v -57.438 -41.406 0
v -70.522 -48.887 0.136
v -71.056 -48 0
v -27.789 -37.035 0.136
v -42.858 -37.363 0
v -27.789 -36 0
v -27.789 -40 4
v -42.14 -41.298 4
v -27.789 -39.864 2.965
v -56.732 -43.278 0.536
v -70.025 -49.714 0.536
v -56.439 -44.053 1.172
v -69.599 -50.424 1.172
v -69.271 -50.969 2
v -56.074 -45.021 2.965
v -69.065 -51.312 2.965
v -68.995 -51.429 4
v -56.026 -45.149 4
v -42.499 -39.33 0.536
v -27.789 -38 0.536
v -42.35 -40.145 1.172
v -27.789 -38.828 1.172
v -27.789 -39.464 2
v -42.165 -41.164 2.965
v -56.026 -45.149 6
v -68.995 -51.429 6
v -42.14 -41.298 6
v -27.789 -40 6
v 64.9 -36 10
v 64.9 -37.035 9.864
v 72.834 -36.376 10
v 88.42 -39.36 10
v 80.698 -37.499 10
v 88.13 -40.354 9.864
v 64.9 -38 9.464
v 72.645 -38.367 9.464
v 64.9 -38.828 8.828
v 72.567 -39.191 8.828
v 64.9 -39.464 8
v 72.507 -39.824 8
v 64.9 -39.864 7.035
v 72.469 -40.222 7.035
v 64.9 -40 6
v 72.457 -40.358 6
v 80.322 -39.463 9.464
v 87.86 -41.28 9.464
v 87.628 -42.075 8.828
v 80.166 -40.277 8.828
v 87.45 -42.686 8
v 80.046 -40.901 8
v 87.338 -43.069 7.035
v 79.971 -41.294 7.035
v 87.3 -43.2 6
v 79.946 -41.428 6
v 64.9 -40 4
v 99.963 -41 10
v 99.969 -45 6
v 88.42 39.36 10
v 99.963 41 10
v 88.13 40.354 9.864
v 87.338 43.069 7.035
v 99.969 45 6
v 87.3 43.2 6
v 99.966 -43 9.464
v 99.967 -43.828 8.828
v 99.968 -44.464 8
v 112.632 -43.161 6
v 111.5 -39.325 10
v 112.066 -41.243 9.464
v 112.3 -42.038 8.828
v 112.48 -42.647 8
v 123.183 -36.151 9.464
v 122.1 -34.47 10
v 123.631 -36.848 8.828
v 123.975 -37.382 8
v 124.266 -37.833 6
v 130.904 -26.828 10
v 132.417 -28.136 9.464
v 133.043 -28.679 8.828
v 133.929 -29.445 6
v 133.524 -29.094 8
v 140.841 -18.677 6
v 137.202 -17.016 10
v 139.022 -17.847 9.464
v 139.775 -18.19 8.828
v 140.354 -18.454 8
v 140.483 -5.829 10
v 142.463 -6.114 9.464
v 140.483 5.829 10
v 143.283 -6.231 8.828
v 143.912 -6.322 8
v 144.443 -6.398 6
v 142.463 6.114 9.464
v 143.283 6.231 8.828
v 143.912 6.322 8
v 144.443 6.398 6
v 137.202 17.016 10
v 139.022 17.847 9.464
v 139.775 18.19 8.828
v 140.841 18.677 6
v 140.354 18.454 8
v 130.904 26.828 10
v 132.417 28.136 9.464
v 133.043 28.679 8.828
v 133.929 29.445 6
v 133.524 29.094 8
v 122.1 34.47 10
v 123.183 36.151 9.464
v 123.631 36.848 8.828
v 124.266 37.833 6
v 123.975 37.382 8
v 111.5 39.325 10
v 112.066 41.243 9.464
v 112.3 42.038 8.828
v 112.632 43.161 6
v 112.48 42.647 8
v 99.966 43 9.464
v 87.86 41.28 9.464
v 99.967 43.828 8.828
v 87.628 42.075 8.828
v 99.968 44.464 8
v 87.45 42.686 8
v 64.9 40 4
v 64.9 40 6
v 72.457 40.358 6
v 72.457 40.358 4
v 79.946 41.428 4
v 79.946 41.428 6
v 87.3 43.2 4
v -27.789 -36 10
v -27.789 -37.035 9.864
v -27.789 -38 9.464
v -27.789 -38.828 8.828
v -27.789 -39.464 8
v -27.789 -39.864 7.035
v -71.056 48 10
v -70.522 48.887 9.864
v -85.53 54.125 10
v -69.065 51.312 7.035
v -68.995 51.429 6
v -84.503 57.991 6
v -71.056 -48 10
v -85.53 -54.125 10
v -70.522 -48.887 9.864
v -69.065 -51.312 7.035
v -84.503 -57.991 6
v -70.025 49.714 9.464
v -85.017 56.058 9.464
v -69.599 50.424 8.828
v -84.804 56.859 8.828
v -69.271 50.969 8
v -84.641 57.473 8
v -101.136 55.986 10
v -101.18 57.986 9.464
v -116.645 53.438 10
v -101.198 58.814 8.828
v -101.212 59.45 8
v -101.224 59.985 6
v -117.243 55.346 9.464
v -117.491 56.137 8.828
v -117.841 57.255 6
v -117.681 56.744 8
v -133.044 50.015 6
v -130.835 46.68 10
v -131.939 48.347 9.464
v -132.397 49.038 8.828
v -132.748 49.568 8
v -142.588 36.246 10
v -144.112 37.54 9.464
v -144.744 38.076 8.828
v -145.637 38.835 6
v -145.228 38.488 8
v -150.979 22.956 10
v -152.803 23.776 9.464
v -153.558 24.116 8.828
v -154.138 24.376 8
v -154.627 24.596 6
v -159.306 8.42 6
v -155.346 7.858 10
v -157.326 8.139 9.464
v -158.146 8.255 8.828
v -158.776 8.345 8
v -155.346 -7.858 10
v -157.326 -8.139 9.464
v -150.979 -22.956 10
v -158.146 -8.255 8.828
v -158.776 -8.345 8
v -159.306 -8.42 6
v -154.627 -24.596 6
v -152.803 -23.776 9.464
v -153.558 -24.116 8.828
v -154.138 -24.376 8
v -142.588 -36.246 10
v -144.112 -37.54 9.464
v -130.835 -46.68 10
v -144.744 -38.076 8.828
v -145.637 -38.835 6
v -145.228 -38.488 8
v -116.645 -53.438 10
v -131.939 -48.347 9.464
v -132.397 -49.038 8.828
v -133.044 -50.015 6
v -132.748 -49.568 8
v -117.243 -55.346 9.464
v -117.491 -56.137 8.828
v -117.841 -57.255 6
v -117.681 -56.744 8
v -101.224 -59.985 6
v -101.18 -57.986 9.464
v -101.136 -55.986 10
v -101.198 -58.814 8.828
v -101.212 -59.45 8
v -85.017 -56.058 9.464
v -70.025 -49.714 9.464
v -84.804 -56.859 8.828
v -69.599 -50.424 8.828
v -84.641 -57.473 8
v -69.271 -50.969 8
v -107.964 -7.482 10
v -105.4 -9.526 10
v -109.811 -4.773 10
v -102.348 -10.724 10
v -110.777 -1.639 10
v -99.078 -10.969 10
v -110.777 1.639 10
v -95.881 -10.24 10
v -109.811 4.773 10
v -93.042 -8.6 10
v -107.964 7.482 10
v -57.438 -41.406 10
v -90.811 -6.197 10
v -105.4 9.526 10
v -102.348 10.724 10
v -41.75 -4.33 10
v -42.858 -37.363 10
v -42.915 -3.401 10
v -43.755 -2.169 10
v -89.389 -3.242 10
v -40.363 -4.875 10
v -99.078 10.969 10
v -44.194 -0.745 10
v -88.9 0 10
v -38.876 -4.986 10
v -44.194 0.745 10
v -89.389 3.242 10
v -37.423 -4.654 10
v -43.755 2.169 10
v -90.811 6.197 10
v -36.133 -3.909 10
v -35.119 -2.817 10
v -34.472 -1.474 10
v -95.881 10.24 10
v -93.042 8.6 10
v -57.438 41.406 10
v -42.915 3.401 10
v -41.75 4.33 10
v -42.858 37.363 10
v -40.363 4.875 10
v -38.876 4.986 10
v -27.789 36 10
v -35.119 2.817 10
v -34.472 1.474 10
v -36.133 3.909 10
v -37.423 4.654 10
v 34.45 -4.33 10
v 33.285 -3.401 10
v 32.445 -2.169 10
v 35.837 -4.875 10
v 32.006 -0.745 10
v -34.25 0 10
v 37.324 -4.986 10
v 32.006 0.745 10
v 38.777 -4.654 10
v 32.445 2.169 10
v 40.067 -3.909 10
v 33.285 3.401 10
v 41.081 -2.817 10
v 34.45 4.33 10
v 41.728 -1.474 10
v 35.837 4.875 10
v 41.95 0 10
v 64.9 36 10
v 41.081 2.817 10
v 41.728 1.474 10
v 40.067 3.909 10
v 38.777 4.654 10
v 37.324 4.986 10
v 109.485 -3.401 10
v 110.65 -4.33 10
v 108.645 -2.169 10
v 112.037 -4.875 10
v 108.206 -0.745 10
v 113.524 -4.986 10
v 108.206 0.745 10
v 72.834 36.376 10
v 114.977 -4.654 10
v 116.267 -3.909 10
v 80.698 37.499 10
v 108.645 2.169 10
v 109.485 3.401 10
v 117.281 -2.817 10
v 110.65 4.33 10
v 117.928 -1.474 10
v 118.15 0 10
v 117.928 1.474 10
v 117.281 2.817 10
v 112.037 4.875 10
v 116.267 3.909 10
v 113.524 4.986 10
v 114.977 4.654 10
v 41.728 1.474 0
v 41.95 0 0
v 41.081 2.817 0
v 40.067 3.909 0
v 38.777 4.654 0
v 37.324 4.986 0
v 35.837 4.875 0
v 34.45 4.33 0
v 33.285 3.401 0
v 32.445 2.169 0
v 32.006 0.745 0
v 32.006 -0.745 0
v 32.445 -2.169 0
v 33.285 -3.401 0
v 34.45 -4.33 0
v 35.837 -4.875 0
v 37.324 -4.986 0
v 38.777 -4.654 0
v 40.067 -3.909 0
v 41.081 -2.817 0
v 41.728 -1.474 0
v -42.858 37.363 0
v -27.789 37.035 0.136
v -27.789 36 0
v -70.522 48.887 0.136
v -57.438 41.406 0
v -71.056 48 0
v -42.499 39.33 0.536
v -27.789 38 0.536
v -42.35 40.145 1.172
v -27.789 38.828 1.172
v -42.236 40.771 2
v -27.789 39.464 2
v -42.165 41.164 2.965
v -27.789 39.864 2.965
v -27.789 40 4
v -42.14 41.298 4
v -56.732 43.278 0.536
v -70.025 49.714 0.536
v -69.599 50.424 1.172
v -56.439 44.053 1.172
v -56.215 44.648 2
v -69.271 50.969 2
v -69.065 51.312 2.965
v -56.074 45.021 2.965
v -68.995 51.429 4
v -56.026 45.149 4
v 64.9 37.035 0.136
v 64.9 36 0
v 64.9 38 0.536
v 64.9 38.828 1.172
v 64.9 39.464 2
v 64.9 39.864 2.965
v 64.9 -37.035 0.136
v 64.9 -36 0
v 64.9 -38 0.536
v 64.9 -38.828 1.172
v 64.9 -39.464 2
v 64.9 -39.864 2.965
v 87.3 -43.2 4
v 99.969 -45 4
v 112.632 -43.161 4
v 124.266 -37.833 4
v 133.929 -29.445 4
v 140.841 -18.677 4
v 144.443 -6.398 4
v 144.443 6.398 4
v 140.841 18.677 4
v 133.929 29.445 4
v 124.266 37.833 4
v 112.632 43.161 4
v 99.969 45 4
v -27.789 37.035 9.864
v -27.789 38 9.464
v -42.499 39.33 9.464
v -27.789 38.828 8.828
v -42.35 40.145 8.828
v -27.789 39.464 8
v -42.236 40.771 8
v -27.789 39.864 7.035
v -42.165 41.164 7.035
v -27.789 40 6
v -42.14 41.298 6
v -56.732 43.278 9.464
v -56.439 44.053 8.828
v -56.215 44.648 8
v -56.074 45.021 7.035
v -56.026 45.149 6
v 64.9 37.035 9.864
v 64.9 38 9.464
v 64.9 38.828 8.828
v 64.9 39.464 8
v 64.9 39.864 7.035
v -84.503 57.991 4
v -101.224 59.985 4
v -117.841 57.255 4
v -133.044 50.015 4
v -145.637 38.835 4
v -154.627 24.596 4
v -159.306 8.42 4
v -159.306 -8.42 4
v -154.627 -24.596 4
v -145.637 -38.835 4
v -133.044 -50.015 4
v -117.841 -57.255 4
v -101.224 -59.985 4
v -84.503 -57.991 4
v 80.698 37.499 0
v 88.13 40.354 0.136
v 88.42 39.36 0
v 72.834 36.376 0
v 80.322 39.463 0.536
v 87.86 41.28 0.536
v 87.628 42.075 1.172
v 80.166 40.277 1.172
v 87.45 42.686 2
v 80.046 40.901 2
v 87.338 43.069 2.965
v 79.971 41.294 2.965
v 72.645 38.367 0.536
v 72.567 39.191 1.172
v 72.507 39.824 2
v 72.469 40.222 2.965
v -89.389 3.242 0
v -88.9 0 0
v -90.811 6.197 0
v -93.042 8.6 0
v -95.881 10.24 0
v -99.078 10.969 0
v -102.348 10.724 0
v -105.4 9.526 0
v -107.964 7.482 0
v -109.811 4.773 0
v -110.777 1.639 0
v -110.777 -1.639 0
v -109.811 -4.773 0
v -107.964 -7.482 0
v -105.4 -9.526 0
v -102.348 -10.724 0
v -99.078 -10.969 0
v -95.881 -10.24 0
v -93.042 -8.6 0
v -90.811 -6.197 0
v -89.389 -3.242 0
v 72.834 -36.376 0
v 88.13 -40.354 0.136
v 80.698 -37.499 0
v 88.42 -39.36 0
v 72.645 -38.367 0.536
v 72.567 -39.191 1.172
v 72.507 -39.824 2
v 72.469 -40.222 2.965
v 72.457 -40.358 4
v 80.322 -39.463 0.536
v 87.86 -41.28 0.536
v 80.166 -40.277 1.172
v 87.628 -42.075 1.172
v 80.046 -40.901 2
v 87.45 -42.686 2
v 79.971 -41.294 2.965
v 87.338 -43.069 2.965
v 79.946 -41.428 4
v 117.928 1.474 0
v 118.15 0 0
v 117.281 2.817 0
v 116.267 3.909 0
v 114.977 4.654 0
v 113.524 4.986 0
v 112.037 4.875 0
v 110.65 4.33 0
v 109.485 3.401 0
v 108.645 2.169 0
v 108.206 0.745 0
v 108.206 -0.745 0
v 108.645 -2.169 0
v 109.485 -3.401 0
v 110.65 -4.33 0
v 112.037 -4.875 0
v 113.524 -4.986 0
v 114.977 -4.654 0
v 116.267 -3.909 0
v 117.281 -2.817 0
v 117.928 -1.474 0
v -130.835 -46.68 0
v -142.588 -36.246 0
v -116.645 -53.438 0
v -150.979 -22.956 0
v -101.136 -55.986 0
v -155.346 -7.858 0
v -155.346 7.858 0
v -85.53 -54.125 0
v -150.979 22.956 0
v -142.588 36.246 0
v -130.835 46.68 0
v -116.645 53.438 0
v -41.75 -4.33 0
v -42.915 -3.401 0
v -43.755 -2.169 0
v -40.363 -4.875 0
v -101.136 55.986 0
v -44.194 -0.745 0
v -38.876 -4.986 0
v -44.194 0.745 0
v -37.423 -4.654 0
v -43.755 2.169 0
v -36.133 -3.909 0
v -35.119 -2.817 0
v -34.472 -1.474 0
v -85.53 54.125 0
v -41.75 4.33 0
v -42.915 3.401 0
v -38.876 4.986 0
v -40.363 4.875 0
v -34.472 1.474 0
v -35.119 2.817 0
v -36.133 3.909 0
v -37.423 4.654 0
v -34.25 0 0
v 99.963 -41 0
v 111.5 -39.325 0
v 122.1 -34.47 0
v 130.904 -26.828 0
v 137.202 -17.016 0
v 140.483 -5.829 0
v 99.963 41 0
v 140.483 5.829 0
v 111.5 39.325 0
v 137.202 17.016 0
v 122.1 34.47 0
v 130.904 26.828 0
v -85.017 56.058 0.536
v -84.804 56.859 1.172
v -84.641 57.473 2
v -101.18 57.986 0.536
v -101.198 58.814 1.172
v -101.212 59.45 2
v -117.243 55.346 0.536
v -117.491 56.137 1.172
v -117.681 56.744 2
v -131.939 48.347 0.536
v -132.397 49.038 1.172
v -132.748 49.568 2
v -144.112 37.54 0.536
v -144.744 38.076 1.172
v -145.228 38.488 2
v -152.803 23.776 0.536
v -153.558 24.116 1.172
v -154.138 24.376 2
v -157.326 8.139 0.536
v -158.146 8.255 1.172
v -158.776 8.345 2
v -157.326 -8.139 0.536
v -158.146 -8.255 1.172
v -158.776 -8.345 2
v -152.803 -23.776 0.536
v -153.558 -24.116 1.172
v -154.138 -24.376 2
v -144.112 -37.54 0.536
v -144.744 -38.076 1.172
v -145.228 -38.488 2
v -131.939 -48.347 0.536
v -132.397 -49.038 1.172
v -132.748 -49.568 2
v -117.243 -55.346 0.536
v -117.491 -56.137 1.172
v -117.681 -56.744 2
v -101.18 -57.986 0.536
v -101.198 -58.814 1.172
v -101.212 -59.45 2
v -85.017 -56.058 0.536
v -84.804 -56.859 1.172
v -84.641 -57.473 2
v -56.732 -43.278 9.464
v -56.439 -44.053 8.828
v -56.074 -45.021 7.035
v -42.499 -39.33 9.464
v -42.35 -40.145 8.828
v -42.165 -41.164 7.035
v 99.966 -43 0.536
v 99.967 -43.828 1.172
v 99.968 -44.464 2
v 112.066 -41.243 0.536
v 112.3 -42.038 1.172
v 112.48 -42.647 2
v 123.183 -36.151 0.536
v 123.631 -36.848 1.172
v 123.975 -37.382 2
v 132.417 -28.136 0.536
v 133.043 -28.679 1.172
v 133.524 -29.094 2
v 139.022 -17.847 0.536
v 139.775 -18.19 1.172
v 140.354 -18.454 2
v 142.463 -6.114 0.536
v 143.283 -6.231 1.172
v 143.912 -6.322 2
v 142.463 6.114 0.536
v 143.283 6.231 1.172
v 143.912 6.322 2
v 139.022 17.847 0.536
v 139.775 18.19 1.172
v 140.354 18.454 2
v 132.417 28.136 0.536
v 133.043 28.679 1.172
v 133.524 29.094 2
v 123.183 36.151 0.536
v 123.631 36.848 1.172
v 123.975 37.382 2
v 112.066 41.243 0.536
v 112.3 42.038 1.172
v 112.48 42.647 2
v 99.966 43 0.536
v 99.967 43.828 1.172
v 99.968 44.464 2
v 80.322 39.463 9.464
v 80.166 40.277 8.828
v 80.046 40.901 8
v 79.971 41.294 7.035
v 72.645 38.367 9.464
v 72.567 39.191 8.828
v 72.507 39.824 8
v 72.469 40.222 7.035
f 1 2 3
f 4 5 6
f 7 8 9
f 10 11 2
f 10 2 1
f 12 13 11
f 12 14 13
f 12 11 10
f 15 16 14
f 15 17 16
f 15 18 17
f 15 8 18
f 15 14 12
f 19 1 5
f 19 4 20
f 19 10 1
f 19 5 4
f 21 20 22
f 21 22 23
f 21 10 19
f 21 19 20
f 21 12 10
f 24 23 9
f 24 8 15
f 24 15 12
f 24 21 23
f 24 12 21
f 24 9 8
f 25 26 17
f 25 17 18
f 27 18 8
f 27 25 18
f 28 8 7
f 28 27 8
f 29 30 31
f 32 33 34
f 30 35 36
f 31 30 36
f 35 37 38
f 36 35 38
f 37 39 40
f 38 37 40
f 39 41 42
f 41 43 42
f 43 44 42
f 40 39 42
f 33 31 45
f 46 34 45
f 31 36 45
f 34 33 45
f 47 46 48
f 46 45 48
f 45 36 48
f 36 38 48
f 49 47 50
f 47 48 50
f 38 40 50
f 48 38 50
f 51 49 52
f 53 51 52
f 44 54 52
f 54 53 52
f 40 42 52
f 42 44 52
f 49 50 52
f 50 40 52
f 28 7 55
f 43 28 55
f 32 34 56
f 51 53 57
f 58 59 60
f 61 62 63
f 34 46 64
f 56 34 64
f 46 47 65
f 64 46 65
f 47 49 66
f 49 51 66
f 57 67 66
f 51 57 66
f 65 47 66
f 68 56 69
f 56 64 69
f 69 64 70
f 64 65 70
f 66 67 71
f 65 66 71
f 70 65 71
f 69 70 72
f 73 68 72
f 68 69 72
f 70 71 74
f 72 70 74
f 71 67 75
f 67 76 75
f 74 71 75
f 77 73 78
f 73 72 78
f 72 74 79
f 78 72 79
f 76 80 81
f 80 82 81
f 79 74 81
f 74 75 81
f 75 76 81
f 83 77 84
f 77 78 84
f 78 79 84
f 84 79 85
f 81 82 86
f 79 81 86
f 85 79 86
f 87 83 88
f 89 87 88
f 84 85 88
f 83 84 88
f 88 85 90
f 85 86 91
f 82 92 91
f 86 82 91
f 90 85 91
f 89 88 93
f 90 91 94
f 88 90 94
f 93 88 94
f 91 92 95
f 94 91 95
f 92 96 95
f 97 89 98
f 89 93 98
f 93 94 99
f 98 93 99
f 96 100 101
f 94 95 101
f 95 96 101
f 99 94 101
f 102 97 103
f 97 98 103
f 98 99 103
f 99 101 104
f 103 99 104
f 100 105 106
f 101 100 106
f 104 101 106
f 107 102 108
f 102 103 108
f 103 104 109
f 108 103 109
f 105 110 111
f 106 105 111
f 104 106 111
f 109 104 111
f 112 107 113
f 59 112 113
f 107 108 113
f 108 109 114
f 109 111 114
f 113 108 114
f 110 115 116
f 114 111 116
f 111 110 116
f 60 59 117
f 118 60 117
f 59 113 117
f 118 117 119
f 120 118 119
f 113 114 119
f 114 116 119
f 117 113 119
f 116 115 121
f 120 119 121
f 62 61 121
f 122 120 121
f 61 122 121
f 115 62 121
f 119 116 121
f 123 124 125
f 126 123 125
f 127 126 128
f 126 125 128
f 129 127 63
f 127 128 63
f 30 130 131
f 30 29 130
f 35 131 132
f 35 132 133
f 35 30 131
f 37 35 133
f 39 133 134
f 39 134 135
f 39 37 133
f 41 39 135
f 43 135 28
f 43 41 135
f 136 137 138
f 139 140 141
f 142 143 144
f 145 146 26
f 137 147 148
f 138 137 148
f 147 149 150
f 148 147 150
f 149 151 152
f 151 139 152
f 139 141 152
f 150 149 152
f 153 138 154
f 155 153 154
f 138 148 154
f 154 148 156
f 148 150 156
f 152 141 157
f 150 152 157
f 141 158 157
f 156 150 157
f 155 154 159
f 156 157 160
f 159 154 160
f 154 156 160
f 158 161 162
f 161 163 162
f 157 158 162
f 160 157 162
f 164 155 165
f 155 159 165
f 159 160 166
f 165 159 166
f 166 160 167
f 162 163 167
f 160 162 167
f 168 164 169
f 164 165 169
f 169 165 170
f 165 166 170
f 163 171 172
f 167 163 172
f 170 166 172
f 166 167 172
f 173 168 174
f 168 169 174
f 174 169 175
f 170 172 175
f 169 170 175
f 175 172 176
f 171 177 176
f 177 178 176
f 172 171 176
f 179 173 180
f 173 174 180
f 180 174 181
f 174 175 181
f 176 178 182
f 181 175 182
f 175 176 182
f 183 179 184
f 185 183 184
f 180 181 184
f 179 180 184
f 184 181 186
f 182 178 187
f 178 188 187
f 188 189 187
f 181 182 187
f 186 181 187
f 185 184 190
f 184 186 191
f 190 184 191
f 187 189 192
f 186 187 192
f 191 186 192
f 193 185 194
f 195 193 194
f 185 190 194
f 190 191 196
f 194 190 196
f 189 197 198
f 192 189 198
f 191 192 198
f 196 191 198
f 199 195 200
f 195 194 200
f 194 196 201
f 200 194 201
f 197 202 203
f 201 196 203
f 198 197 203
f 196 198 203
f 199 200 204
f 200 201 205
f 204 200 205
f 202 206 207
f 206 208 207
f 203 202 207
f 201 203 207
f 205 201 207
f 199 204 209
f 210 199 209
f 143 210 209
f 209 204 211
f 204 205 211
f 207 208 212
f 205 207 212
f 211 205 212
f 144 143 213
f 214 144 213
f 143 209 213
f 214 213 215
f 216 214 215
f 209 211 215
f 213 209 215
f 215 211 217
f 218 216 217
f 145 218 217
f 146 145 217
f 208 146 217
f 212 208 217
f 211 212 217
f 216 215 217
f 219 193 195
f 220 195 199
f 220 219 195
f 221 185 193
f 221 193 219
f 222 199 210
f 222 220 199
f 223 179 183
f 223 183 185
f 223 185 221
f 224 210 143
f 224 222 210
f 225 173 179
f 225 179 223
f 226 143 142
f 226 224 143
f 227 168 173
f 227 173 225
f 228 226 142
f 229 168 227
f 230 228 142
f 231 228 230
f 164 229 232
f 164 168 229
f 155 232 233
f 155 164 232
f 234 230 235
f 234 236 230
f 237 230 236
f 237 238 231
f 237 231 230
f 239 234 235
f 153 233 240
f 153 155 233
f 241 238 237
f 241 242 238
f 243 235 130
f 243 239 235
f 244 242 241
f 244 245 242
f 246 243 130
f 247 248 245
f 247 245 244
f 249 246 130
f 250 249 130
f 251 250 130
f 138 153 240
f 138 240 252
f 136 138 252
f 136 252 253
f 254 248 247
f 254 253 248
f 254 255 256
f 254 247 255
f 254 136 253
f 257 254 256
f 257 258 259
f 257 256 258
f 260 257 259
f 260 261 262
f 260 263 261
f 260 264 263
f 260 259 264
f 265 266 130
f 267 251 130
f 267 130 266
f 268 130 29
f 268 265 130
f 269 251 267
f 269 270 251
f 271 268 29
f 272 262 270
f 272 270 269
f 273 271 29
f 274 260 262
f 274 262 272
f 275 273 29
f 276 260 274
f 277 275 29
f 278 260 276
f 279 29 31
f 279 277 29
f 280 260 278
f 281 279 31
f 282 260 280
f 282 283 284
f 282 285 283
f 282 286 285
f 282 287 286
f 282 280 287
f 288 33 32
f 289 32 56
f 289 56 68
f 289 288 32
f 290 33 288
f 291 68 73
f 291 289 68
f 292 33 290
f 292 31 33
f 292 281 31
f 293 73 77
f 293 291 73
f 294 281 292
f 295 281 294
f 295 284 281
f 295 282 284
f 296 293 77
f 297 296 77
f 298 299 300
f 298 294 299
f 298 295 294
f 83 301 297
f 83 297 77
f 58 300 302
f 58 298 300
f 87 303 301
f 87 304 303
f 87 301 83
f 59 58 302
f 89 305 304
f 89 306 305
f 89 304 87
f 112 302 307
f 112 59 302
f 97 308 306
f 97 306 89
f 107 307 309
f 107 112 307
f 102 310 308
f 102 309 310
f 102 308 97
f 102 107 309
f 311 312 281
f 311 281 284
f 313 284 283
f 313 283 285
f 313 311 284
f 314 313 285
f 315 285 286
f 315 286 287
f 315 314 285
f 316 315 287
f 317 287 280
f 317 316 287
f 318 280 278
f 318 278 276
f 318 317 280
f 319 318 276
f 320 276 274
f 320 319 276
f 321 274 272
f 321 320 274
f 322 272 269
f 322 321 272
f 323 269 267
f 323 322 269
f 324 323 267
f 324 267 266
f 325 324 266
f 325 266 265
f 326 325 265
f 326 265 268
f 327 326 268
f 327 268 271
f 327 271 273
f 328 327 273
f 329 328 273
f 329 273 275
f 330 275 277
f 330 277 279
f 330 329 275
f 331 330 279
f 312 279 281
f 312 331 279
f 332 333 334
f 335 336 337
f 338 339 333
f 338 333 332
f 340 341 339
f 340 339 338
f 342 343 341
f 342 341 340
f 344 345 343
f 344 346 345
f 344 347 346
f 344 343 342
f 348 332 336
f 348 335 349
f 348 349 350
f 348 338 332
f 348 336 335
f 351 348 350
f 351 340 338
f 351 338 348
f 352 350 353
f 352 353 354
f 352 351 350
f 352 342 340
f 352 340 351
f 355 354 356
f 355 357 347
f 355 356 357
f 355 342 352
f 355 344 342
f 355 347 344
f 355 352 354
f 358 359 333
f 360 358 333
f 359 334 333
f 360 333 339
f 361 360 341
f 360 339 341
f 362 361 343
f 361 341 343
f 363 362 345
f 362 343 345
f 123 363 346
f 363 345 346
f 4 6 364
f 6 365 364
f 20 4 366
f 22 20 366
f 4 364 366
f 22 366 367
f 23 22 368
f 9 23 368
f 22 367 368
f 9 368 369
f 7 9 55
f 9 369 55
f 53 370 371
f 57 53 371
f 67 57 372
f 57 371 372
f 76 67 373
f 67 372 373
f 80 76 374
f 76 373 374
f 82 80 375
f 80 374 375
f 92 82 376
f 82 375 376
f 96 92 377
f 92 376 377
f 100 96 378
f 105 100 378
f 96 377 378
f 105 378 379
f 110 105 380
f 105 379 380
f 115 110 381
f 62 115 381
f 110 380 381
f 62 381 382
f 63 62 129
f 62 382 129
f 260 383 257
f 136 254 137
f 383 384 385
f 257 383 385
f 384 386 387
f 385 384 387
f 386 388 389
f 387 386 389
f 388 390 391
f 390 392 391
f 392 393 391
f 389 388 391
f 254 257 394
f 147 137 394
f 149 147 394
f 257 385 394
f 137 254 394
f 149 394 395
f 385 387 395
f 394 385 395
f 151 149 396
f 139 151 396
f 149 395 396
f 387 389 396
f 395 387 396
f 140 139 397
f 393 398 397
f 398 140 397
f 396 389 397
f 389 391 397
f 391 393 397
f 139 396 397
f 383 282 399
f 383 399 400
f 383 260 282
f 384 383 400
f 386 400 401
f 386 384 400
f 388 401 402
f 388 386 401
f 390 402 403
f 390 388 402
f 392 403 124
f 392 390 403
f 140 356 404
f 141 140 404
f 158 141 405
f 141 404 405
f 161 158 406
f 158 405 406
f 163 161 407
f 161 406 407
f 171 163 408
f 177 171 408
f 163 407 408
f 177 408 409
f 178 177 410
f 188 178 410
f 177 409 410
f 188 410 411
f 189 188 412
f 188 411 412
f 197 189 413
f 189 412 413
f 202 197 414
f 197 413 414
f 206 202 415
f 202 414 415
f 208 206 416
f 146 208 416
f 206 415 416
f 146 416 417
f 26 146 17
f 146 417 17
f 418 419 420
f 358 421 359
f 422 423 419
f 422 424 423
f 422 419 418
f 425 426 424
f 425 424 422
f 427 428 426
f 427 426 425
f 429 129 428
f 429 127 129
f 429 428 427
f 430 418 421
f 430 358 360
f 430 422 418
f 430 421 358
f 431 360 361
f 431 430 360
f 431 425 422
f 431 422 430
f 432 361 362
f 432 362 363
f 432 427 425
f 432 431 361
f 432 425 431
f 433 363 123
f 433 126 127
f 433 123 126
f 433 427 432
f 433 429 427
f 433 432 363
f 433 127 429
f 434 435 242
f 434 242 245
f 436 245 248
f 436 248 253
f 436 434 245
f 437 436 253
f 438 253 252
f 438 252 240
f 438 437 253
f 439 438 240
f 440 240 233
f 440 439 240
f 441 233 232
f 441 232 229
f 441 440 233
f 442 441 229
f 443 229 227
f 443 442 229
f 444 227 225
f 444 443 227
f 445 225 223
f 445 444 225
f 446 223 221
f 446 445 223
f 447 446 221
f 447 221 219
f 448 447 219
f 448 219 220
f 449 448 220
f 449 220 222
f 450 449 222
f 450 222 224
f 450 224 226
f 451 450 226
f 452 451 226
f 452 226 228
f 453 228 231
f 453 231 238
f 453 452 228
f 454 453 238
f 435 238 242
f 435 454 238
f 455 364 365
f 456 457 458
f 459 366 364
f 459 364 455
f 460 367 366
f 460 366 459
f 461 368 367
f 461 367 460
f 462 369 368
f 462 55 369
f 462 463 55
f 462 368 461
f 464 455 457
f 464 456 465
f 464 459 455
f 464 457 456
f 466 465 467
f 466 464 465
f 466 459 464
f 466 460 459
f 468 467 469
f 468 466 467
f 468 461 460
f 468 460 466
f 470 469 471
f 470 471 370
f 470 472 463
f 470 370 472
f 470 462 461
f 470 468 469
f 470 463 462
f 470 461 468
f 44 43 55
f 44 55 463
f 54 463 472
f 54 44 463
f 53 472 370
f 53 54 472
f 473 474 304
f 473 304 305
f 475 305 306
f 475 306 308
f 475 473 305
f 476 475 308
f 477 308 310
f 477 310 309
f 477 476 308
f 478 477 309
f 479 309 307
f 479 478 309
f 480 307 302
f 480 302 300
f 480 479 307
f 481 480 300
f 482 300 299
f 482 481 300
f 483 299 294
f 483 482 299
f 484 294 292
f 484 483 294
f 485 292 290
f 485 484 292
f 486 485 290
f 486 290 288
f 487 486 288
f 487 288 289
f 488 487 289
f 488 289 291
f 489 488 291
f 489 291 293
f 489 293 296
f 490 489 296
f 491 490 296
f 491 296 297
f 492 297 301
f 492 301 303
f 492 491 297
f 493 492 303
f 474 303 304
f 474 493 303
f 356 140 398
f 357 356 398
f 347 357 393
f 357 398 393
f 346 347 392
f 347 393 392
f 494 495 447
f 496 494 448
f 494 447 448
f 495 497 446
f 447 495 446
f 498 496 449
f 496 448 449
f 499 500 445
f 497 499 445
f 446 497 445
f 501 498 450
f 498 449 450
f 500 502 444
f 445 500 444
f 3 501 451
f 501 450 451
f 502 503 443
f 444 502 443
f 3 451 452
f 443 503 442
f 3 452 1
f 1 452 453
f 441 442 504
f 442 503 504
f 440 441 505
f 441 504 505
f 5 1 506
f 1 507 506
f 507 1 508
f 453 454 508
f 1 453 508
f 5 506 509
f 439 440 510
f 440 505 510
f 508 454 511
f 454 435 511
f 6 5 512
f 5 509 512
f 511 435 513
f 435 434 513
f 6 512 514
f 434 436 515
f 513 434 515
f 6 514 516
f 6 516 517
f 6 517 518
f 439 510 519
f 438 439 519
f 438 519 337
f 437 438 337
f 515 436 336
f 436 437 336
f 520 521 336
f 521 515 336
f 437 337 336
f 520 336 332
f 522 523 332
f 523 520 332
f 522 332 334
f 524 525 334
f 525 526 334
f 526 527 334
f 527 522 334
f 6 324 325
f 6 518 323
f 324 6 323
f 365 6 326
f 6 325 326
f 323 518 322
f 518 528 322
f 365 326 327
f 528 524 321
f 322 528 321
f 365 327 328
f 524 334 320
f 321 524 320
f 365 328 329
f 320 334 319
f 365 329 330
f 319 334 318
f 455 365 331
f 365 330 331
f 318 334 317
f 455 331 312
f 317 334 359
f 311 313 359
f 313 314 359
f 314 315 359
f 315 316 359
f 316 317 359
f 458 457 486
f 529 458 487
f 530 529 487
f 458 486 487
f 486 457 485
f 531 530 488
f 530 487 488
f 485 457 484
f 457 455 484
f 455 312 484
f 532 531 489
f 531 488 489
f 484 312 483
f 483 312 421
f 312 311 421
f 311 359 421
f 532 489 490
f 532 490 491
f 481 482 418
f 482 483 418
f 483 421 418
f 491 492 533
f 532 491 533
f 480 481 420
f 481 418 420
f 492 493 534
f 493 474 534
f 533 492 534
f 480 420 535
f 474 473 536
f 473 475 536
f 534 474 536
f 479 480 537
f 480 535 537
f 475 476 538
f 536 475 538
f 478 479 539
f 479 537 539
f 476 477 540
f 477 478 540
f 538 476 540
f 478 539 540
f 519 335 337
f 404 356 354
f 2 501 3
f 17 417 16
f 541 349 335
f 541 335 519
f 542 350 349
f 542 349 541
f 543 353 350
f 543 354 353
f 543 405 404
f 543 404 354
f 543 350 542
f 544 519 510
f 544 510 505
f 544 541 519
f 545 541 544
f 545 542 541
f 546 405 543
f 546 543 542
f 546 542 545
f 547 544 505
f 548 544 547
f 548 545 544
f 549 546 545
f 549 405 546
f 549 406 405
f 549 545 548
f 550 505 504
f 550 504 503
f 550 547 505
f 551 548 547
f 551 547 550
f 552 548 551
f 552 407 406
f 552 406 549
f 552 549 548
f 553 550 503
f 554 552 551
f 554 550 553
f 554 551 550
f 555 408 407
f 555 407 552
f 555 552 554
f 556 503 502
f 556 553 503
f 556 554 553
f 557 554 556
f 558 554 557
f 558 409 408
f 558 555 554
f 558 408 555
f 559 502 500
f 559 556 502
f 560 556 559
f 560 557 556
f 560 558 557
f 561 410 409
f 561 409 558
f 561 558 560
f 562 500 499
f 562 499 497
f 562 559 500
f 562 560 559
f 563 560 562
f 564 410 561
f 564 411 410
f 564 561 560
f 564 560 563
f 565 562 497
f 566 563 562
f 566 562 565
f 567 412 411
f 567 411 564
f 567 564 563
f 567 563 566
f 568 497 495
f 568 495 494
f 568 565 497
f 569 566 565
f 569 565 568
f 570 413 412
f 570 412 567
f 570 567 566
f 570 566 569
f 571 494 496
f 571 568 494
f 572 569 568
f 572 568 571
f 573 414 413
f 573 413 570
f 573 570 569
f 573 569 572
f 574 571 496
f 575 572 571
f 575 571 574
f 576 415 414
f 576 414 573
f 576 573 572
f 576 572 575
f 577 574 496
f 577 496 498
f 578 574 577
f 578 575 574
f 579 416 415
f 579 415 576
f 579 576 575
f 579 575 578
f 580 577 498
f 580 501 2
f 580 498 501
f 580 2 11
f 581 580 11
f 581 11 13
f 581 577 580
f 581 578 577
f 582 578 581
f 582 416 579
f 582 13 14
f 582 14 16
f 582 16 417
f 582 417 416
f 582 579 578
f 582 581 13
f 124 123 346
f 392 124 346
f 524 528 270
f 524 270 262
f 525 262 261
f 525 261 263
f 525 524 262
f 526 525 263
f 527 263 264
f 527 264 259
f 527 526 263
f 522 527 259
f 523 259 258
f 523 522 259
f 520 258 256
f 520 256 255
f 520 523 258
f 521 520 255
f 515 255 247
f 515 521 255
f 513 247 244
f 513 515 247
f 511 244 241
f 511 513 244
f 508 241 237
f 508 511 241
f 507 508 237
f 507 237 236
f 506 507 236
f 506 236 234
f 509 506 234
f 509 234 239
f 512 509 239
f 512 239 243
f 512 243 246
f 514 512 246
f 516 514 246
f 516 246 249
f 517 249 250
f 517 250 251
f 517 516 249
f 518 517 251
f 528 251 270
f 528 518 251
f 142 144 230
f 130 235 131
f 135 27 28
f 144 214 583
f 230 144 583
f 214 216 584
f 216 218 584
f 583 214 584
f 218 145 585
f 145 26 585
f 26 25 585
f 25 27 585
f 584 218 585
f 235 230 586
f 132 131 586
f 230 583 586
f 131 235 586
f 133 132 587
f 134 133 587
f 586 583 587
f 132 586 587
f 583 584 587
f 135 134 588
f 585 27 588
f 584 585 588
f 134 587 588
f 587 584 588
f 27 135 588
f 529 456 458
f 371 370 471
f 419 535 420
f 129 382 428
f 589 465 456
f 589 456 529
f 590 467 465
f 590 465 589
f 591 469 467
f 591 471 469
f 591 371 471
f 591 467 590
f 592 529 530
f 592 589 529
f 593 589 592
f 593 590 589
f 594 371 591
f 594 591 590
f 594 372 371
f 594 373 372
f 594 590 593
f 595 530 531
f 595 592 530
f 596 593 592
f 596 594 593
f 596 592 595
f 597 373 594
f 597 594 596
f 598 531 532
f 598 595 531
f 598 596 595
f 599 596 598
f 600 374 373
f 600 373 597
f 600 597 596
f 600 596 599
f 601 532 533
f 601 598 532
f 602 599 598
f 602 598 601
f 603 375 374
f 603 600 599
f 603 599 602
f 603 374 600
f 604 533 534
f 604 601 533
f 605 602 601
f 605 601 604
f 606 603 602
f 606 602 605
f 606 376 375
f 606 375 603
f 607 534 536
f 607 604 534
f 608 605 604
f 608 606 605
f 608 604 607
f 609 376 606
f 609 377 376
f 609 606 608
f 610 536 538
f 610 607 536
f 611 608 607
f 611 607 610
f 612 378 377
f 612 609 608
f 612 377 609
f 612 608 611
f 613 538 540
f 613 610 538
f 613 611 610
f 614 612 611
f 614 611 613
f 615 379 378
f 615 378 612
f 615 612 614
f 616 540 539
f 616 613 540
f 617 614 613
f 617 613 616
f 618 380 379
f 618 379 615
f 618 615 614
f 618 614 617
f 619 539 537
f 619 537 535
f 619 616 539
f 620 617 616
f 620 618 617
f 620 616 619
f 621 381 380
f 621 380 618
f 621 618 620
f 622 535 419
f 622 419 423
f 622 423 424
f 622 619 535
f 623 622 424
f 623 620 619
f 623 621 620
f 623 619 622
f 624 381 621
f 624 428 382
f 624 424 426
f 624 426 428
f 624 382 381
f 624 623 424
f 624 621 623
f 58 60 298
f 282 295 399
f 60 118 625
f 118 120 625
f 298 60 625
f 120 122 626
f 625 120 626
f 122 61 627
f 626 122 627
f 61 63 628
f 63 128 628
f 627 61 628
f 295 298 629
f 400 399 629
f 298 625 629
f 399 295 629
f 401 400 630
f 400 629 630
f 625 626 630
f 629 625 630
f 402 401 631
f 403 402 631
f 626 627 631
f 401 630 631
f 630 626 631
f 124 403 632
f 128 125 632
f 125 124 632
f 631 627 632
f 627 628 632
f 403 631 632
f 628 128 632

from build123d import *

# Parameters (mm, degrees)
SKETCH1_R           = 11
SKETCH1_R_2         = 5
BOSS_EXTRUDE1_DEPTH = 10
FILLET1_R           = 80
FILLET2_R           = 4


with BuildPart() as part:
    # Sketch1 → Boss-Extrude1 (new body)
    with BuildSketch(Plane.XY):
        with BuildLine():
            ThreePointArc((-55.17864045, 40), (-159.9, 0), (-55.17864045, -40))
            Line((-55.17864045, -40), (79.284471872, -40))
            ThreePointArc((79.284471872, -40), (144.9, 0), (79.284471872, 40))
            Line((79.284471872, 40), (-55.17864045, 40))
        make_face()
        with Locations((-99.9, 0)):
            Circle(SKETCH1_R, mode=Mode.SUBTRACT)
        with Locations((-39.25, 0)):
            Circle(SKETCH1_R_2, mode=Mode.SUBTRACT)
        with Locations((36.95, 0)):
            Circle(SKETCH1_R_2, mode=Mode.SUBTRACT)
        with Locations((113.15, 0)):
            Circle(SKETCH1_R_2, mode=Mode.SUBTRACT)
    extrude(amount=BOSS_EXTRUDE1_DEPTH)

    # Fillet1
    fillet1_edges = [part.edges().sort_by_distance(p)[0] for p in [
        (79.284471872, 40, 5),
        (79.284471872, -40, 5),
        (-55.17864045, -40, 5),
        (-55.17864045, 40, 5),
    ]]
    fillet(fillet1_edges, radius=FILLET1_R)

    # Fillet2
    fillet2_edges = [part.edges().sort_by_distance(p)[0] for p in [
        (18.555512755, -40, 0),
        (18.555512755, -40, 10),
        (-159.9, 0, 0),
        (-159.9, 0, 10),
        (18.555512755, 40, 0),
        (18.555512755, 40, 10),
        (144.9, 0, 0),
        (144.9, 0, 10),
        (-49.169873844, -42.910071067, 0),
        (-49.169873844, -42.910071067, 10),
        (-49.169873844, 42.910071067, 0),
        (-49.169873844, 42.910071067, 10),
        (76.213708499, -40.804040507, 0),
        (76.213708499, -40.804040507, 10),
        (76.213708499, 40.804040507, 0),
        (76.213708499, 40.804040507, 10),
    ]]
    fillet(fillet2_edges, radius=FILLET2_R)


solid = part.part
